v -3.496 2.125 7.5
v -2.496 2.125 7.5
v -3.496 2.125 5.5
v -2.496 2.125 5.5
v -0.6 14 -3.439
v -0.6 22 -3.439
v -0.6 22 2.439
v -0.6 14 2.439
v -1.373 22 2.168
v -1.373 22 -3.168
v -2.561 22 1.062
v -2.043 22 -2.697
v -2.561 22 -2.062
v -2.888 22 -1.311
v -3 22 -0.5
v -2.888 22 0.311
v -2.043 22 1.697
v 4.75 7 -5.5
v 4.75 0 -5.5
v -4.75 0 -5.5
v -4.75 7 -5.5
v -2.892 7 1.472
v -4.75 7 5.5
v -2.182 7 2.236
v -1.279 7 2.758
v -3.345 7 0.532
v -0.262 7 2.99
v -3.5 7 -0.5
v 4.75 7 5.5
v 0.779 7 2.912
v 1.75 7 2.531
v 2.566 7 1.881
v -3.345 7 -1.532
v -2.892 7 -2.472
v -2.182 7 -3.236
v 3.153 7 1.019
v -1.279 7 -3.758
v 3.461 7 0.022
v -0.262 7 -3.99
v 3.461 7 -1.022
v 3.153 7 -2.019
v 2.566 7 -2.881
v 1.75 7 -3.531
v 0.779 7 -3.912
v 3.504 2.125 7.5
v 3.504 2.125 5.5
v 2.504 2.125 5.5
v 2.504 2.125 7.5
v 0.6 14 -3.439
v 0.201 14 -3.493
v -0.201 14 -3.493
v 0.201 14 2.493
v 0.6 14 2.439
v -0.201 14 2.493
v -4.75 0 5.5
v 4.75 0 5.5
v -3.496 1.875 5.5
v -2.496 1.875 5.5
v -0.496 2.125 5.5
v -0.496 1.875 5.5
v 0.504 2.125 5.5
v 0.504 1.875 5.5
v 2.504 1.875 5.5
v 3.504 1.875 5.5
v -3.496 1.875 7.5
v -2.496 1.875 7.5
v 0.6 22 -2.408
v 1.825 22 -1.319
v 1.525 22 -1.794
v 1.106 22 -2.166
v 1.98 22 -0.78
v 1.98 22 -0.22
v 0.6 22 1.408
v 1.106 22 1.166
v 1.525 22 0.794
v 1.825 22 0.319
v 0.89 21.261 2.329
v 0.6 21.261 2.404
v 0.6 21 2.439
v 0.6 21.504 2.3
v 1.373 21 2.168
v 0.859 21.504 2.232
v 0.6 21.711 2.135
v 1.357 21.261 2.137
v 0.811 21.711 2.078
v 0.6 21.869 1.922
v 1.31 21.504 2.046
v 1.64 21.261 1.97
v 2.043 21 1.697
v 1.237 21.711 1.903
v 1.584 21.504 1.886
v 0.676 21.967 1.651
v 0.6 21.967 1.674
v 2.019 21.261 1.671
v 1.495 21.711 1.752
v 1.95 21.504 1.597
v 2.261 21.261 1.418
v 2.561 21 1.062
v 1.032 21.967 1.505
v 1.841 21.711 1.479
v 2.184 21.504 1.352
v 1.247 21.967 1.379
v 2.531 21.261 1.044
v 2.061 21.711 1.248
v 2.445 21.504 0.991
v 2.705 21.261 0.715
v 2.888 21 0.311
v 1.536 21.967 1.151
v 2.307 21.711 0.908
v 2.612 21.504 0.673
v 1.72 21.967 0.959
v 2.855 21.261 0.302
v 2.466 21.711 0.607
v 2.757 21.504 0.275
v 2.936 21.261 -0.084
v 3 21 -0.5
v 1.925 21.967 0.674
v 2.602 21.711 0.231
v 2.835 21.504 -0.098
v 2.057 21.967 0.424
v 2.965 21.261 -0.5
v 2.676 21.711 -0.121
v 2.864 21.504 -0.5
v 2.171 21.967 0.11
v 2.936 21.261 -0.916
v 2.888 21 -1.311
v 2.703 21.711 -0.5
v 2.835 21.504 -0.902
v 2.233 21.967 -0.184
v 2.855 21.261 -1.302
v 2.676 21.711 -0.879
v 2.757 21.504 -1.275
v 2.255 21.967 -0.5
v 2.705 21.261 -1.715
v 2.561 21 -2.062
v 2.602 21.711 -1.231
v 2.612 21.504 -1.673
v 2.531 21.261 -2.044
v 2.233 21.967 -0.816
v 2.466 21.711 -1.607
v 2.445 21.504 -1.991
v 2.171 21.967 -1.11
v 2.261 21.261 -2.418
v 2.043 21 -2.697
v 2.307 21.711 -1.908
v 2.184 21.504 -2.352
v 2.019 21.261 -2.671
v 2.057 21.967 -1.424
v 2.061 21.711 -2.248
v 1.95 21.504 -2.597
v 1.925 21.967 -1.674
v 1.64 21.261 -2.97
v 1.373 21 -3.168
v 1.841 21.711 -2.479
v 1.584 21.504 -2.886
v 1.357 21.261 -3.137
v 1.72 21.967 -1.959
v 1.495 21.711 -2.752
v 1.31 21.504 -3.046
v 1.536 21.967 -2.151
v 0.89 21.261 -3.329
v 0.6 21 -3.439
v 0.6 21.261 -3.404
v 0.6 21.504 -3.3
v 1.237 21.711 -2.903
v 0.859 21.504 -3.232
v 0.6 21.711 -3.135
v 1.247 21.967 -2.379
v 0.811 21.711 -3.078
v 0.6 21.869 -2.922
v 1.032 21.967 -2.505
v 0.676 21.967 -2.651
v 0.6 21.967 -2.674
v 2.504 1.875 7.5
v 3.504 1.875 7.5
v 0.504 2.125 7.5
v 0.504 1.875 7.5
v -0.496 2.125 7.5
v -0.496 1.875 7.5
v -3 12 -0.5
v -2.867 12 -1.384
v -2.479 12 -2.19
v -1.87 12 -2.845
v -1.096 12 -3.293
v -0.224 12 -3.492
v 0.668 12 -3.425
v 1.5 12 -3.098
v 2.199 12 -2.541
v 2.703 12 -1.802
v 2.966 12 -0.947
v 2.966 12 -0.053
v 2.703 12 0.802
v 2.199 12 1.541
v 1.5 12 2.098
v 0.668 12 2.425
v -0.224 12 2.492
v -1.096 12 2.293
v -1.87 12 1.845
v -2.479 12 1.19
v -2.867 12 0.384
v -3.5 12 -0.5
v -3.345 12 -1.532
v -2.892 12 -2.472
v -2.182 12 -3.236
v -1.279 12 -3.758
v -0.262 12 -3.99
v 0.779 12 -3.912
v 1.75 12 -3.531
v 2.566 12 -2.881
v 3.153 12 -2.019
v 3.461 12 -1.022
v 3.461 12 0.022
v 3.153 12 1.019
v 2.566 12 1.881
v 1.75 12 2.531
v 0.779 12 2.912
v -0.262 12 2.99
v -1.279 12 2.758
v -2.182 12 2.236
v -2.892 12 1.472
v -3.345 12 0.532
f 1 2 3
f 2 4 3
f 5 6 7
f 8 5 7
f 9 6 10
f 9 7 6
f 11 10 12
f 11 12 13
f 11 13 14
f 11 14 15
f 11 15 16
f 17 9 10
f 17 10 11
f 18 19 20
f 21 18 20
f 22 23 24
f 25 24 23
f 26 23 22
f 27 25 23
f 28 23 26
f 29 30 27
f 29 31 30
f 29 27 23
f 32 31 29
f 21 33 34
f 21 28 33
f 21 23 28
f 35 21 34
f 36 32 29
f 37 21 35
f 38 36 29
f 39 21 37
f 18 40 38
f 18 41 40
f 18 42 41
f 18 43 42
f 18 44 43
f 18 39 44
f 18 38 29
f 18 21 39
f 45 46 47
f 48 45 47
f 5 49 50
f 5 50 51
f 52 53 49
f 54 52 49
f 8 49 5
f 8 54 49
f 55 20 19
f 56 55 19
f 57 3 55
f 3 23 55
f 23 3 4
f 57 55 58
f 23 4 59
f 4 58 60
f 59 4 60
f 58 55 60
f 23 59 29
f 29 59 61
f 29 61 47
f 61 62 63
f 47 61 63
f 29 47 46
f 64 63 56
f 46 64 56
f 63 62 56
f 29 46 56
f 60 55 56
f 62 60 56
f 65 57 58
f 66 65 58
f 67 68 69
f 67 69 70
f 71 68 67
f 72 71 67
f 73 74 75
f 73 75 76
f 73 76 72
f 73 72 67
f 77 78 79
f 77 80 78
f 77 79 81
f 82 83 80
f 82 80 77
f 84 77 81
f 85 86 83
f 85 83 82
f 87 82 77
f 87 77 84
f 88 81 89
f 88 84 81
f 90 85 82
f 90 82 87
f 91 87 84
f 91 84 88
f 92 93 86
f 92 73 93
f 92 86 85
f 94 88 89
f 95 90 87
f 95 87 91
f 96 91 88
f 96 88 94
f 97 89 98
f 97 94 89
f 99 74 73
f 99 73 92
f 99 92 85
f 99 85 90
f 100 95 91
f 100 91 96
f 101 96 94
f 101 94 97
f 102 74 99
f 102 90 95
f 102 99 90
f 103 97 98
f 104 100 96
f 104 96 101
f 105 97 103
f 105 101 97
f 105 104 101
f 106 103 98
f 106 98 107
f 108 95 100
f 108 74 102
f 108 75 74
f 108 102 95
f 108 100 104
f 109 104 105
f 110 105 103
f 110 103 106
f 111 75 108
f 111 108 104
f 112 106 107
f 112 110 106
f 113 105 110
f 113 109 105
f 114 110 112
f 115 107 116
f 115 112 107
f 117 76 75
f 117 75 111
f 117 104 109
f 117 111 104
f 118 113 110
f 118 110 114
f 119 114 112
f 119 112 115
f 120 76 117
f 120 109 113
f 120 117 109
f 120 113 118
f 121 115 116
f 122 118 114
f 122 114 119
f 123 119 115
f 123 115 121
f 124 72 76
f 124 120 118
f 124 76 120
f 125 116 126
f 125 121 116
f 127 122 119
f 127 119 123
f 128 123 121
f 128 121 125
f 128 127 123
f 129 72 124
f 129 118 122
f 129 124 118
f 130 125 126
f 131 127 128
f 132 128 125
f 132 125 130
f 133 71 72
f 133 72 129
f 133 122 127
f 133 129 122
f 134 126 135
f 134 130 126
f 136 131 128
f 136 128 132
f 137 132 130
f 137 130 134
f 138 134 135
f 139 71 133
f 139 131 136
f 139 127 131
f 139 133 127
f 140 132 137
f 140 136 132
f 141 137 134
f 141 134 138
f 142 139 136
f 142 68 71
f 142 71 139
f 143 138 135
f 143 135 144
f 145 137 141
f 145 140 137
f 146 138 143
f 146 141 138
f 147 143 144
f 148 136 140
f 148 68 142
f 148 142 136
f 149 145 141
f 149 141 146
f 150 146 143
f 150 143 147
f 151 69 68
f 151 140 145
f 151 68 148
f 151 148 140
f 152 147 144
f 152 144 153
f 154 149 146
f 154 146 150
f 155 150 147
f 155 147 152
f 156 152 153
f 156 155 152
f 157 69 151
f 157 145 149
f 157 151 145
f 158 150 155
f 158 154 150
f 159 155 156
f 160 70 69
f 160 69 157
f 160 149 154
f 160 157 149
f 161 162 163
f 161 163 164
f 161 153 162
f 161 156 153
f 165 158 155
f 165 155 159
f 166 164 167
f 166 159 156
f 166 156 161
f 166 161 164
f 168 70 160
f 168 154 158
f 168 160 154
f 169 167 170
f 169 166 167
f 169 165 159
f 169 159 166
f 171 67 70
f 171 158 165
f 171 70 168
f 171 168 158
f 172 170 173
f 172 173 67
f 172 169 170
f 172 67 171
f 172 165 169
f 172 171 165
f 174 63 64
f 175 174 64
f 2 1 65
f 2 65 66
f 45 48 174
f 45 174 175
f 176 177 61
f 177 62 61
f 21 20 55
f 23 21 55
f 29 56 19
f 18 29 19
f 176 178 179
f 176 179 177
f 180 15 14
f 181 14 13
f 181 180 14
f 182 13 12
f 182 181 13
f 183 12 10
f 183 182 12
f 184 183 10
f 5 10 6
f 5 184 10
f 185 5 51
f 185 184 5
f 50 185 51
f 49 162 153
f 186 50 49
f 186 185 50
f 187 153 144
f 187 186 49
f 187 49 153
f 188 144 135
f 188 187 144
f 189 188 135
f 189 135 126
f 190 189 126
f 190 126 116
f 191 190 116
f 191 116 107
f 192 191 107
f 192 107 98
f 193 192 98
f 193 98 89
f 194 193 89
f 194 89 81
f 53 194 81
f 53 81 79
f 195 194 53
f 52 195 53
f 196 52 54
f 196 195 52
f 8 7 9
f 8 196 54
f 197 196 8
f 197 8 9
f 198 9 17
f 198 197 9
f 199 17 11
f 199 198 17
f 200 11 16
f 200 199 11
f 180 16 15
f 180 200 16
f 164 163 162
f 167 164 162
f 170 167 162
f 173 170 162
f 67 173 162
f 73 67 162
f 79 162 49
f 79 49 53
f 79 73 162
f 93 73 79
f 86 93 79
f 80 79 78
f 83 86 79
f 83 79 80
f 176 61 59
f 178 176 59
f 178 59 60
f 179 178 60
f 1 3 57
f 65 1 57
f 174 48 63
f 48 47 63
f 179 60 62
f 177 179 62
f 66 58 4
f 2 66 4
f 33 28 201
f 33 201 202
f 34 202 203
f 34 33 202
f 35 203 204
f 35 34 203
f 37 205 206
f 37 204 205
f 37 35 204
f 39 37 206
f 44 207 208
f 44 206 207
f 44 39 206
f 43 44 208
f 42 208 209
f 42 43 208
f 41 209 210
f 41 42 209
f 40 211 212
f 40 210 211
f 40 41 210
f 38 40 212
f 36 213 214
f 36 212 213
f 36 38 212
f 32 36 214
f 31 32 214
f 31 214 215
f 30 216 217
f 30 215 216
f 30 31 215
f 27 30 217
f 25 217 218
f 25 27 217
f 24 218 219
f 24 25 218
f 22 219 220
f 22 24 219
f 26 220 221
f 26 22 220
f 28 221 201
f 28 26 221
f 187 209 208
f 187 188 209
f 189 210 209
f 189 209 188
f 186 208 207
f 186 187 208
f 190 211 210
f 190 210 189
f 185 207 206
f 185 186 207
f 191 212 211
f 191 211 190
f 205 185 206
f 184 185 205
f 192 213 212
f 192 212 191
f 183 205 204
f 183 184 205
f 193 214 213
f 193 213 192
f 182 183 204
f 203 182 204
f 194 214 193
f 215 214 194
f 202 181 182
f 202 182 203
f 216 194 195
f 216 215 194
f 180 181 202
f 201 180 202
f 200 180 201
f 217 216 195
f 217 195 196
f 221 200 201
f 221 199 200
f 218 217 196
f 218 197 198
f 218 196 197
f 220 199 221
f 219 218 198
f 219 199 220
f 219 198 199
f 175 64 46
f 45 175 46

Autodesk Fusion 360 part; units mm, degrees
sketch "Esquisse1" plane through (0, 0, 0) normal (0, 1, 0) x (1, 0, 0)
  line L0 (4.75, 5.5) -> (-4.75, 5.5)
  line L1 (-4.75, 5.5) -> (-4.75, -5.5)
  line L2 (-4.75, -5.5) -> (4.75, -5.5)
  line L3 (4.75, -5.5) -> (4.75, 5.5)
  line L4 (4.75, 5.5) -> (-4.75, -5.5) construction
  line L5 (-4.75, 5.5) -> (4.75, -5.5) construction
  dimension "d1" = 11
  dimension "d2" = 9.5
extrude "Extrusion1" add sketch "Esquisse1" along normal blind 7
sketch "Esquisse2" plane through (0, 7, 0) normal (0, 1, 0) x (-1, 0, 0)
  line L0 (-4.75, 5.5) -> (-4.75, -5.5)
  line L1 (-4.75, -5.5) -> (4.75, -5.5)
  line L2 (4.75, -5.5) -> (4.75, 5.5)
  line L3 (4.75, 5.5) -> (-4.75, 5.5)
  circle A0 centre (0, -0.5) radius 3.5
  dimension "d5" = 7
  dimension "d27" = 5
extrude "Extrusion2" add sketch "Esquisse2" along normal blind 5 contours A0
sketch "Esquisse3" plane through (0, 12, 0) normal (0, 1, 0) x (-1, 0, 0)
  circle A0 centre (0, -0.5) radius 3.5
  circle A1 centre (0, -0.5) radius 3
  dimension "d8" = 6
extrude "Extrusion3" add sketch "Esquisse3" along normal blind 10 contours A1
sketch "Esquisse4" plane through (0, 22, 0) normal (0, 1, 0) x (-1, 0, 0)
  circle A0 centre (0, -0.5) radius 3
  circle A1 centre (0, -0.5) radius 3
  line L0 (0.6, -3.4394) -> (0.6, 2.4394)
  line L1 (-0.6, -3.4394) -> (-0.6, 2.4394)
  dimension "d11" = 0.6
  dimension "d12" = 0.6
extrude "Extrusion4" cut sketch "Esquisse4" against normal blind 8 contours A0 A1 L0 L1
fillet "Congé1" radius 1 2 edges at (-3, 22, -0.5) (3, 22, -0.5)
sketch "Esquisse5" plane through (0, 0, 5.5) normal (0, 0, 1) x (1, 0, 0)
  line L0 (-4.75, 0) -> (4.75, 0)
  line L1 (4.75, 0) -> (4.75, 7)
  line L2 (4.75, 7) -> (-4.75, 7)
  line L3 (-4.75, 7) -> (-4.75, 0)
  line L4 (0.5041, 2.125) -> (-0.4959, 2.125)
  line L5 (-0.4959, 2.125) -> (-0.4959, 1.875)
  line L6 (-0.4959, 1.875) -> (0.5041, 1.875)
  line L7 (0.5041, 1.875) -> (0.5041, 2.125)
  line L8 (0.5041, 2.125) -> (-0.4959, 1.875) construction
  line L9 (-0.4959, 2.125) -> (0.5041, 1.875) construction
  line L10 (0, 0) -> (0, 7) construction
  line L11 (-3.4959, 1.875) -> (-2.4959, 1.875)
  line L12 (-3.4959, 2.125) -> (-3.4959, 1.875)
  line L13 (-2.4959, 2.125) -> (-3.4959, 2.125)
  line L14 (-2.4959, 2.125) -> (-3.4959, 1.875) construction
  line L15 (-2.4959, 1.875) -> (-2.4959, 2.125)
  line L16 (-3.4959, 2.125) -> (-2.4959, 1.875) construction
  line L17 (2.5041, 1.875) -> (3.5041, 1.875)
  line L18 (2.5041, 2.125) -> (2.5041, 1.875)
  line L19 (3.5041, 2.125) -> (2.5041, 2.125)
  line L20 (3.5041, 2.125) -> (2.5041, 1.875) construction
  line L21 (3.5041, 1.875) -> (3.5041, 2.125)
  line L22 (2.5041, 2.125) -> (3.5041, 1.875) construction
  point P0 (0.0041, 2)
  dimension "d18" = 1
  dimension "d19" = 0.25
  dimension "d20" = 2
  dimension "d23" = 3
  dimension "d24" = 0
extrude "Extrusion5" add sketch "Esquisse5" along normal blind 2 contours L4 L5 L6 L7 | L11 L12 L13 L15 | L17 L18 L19 L21
